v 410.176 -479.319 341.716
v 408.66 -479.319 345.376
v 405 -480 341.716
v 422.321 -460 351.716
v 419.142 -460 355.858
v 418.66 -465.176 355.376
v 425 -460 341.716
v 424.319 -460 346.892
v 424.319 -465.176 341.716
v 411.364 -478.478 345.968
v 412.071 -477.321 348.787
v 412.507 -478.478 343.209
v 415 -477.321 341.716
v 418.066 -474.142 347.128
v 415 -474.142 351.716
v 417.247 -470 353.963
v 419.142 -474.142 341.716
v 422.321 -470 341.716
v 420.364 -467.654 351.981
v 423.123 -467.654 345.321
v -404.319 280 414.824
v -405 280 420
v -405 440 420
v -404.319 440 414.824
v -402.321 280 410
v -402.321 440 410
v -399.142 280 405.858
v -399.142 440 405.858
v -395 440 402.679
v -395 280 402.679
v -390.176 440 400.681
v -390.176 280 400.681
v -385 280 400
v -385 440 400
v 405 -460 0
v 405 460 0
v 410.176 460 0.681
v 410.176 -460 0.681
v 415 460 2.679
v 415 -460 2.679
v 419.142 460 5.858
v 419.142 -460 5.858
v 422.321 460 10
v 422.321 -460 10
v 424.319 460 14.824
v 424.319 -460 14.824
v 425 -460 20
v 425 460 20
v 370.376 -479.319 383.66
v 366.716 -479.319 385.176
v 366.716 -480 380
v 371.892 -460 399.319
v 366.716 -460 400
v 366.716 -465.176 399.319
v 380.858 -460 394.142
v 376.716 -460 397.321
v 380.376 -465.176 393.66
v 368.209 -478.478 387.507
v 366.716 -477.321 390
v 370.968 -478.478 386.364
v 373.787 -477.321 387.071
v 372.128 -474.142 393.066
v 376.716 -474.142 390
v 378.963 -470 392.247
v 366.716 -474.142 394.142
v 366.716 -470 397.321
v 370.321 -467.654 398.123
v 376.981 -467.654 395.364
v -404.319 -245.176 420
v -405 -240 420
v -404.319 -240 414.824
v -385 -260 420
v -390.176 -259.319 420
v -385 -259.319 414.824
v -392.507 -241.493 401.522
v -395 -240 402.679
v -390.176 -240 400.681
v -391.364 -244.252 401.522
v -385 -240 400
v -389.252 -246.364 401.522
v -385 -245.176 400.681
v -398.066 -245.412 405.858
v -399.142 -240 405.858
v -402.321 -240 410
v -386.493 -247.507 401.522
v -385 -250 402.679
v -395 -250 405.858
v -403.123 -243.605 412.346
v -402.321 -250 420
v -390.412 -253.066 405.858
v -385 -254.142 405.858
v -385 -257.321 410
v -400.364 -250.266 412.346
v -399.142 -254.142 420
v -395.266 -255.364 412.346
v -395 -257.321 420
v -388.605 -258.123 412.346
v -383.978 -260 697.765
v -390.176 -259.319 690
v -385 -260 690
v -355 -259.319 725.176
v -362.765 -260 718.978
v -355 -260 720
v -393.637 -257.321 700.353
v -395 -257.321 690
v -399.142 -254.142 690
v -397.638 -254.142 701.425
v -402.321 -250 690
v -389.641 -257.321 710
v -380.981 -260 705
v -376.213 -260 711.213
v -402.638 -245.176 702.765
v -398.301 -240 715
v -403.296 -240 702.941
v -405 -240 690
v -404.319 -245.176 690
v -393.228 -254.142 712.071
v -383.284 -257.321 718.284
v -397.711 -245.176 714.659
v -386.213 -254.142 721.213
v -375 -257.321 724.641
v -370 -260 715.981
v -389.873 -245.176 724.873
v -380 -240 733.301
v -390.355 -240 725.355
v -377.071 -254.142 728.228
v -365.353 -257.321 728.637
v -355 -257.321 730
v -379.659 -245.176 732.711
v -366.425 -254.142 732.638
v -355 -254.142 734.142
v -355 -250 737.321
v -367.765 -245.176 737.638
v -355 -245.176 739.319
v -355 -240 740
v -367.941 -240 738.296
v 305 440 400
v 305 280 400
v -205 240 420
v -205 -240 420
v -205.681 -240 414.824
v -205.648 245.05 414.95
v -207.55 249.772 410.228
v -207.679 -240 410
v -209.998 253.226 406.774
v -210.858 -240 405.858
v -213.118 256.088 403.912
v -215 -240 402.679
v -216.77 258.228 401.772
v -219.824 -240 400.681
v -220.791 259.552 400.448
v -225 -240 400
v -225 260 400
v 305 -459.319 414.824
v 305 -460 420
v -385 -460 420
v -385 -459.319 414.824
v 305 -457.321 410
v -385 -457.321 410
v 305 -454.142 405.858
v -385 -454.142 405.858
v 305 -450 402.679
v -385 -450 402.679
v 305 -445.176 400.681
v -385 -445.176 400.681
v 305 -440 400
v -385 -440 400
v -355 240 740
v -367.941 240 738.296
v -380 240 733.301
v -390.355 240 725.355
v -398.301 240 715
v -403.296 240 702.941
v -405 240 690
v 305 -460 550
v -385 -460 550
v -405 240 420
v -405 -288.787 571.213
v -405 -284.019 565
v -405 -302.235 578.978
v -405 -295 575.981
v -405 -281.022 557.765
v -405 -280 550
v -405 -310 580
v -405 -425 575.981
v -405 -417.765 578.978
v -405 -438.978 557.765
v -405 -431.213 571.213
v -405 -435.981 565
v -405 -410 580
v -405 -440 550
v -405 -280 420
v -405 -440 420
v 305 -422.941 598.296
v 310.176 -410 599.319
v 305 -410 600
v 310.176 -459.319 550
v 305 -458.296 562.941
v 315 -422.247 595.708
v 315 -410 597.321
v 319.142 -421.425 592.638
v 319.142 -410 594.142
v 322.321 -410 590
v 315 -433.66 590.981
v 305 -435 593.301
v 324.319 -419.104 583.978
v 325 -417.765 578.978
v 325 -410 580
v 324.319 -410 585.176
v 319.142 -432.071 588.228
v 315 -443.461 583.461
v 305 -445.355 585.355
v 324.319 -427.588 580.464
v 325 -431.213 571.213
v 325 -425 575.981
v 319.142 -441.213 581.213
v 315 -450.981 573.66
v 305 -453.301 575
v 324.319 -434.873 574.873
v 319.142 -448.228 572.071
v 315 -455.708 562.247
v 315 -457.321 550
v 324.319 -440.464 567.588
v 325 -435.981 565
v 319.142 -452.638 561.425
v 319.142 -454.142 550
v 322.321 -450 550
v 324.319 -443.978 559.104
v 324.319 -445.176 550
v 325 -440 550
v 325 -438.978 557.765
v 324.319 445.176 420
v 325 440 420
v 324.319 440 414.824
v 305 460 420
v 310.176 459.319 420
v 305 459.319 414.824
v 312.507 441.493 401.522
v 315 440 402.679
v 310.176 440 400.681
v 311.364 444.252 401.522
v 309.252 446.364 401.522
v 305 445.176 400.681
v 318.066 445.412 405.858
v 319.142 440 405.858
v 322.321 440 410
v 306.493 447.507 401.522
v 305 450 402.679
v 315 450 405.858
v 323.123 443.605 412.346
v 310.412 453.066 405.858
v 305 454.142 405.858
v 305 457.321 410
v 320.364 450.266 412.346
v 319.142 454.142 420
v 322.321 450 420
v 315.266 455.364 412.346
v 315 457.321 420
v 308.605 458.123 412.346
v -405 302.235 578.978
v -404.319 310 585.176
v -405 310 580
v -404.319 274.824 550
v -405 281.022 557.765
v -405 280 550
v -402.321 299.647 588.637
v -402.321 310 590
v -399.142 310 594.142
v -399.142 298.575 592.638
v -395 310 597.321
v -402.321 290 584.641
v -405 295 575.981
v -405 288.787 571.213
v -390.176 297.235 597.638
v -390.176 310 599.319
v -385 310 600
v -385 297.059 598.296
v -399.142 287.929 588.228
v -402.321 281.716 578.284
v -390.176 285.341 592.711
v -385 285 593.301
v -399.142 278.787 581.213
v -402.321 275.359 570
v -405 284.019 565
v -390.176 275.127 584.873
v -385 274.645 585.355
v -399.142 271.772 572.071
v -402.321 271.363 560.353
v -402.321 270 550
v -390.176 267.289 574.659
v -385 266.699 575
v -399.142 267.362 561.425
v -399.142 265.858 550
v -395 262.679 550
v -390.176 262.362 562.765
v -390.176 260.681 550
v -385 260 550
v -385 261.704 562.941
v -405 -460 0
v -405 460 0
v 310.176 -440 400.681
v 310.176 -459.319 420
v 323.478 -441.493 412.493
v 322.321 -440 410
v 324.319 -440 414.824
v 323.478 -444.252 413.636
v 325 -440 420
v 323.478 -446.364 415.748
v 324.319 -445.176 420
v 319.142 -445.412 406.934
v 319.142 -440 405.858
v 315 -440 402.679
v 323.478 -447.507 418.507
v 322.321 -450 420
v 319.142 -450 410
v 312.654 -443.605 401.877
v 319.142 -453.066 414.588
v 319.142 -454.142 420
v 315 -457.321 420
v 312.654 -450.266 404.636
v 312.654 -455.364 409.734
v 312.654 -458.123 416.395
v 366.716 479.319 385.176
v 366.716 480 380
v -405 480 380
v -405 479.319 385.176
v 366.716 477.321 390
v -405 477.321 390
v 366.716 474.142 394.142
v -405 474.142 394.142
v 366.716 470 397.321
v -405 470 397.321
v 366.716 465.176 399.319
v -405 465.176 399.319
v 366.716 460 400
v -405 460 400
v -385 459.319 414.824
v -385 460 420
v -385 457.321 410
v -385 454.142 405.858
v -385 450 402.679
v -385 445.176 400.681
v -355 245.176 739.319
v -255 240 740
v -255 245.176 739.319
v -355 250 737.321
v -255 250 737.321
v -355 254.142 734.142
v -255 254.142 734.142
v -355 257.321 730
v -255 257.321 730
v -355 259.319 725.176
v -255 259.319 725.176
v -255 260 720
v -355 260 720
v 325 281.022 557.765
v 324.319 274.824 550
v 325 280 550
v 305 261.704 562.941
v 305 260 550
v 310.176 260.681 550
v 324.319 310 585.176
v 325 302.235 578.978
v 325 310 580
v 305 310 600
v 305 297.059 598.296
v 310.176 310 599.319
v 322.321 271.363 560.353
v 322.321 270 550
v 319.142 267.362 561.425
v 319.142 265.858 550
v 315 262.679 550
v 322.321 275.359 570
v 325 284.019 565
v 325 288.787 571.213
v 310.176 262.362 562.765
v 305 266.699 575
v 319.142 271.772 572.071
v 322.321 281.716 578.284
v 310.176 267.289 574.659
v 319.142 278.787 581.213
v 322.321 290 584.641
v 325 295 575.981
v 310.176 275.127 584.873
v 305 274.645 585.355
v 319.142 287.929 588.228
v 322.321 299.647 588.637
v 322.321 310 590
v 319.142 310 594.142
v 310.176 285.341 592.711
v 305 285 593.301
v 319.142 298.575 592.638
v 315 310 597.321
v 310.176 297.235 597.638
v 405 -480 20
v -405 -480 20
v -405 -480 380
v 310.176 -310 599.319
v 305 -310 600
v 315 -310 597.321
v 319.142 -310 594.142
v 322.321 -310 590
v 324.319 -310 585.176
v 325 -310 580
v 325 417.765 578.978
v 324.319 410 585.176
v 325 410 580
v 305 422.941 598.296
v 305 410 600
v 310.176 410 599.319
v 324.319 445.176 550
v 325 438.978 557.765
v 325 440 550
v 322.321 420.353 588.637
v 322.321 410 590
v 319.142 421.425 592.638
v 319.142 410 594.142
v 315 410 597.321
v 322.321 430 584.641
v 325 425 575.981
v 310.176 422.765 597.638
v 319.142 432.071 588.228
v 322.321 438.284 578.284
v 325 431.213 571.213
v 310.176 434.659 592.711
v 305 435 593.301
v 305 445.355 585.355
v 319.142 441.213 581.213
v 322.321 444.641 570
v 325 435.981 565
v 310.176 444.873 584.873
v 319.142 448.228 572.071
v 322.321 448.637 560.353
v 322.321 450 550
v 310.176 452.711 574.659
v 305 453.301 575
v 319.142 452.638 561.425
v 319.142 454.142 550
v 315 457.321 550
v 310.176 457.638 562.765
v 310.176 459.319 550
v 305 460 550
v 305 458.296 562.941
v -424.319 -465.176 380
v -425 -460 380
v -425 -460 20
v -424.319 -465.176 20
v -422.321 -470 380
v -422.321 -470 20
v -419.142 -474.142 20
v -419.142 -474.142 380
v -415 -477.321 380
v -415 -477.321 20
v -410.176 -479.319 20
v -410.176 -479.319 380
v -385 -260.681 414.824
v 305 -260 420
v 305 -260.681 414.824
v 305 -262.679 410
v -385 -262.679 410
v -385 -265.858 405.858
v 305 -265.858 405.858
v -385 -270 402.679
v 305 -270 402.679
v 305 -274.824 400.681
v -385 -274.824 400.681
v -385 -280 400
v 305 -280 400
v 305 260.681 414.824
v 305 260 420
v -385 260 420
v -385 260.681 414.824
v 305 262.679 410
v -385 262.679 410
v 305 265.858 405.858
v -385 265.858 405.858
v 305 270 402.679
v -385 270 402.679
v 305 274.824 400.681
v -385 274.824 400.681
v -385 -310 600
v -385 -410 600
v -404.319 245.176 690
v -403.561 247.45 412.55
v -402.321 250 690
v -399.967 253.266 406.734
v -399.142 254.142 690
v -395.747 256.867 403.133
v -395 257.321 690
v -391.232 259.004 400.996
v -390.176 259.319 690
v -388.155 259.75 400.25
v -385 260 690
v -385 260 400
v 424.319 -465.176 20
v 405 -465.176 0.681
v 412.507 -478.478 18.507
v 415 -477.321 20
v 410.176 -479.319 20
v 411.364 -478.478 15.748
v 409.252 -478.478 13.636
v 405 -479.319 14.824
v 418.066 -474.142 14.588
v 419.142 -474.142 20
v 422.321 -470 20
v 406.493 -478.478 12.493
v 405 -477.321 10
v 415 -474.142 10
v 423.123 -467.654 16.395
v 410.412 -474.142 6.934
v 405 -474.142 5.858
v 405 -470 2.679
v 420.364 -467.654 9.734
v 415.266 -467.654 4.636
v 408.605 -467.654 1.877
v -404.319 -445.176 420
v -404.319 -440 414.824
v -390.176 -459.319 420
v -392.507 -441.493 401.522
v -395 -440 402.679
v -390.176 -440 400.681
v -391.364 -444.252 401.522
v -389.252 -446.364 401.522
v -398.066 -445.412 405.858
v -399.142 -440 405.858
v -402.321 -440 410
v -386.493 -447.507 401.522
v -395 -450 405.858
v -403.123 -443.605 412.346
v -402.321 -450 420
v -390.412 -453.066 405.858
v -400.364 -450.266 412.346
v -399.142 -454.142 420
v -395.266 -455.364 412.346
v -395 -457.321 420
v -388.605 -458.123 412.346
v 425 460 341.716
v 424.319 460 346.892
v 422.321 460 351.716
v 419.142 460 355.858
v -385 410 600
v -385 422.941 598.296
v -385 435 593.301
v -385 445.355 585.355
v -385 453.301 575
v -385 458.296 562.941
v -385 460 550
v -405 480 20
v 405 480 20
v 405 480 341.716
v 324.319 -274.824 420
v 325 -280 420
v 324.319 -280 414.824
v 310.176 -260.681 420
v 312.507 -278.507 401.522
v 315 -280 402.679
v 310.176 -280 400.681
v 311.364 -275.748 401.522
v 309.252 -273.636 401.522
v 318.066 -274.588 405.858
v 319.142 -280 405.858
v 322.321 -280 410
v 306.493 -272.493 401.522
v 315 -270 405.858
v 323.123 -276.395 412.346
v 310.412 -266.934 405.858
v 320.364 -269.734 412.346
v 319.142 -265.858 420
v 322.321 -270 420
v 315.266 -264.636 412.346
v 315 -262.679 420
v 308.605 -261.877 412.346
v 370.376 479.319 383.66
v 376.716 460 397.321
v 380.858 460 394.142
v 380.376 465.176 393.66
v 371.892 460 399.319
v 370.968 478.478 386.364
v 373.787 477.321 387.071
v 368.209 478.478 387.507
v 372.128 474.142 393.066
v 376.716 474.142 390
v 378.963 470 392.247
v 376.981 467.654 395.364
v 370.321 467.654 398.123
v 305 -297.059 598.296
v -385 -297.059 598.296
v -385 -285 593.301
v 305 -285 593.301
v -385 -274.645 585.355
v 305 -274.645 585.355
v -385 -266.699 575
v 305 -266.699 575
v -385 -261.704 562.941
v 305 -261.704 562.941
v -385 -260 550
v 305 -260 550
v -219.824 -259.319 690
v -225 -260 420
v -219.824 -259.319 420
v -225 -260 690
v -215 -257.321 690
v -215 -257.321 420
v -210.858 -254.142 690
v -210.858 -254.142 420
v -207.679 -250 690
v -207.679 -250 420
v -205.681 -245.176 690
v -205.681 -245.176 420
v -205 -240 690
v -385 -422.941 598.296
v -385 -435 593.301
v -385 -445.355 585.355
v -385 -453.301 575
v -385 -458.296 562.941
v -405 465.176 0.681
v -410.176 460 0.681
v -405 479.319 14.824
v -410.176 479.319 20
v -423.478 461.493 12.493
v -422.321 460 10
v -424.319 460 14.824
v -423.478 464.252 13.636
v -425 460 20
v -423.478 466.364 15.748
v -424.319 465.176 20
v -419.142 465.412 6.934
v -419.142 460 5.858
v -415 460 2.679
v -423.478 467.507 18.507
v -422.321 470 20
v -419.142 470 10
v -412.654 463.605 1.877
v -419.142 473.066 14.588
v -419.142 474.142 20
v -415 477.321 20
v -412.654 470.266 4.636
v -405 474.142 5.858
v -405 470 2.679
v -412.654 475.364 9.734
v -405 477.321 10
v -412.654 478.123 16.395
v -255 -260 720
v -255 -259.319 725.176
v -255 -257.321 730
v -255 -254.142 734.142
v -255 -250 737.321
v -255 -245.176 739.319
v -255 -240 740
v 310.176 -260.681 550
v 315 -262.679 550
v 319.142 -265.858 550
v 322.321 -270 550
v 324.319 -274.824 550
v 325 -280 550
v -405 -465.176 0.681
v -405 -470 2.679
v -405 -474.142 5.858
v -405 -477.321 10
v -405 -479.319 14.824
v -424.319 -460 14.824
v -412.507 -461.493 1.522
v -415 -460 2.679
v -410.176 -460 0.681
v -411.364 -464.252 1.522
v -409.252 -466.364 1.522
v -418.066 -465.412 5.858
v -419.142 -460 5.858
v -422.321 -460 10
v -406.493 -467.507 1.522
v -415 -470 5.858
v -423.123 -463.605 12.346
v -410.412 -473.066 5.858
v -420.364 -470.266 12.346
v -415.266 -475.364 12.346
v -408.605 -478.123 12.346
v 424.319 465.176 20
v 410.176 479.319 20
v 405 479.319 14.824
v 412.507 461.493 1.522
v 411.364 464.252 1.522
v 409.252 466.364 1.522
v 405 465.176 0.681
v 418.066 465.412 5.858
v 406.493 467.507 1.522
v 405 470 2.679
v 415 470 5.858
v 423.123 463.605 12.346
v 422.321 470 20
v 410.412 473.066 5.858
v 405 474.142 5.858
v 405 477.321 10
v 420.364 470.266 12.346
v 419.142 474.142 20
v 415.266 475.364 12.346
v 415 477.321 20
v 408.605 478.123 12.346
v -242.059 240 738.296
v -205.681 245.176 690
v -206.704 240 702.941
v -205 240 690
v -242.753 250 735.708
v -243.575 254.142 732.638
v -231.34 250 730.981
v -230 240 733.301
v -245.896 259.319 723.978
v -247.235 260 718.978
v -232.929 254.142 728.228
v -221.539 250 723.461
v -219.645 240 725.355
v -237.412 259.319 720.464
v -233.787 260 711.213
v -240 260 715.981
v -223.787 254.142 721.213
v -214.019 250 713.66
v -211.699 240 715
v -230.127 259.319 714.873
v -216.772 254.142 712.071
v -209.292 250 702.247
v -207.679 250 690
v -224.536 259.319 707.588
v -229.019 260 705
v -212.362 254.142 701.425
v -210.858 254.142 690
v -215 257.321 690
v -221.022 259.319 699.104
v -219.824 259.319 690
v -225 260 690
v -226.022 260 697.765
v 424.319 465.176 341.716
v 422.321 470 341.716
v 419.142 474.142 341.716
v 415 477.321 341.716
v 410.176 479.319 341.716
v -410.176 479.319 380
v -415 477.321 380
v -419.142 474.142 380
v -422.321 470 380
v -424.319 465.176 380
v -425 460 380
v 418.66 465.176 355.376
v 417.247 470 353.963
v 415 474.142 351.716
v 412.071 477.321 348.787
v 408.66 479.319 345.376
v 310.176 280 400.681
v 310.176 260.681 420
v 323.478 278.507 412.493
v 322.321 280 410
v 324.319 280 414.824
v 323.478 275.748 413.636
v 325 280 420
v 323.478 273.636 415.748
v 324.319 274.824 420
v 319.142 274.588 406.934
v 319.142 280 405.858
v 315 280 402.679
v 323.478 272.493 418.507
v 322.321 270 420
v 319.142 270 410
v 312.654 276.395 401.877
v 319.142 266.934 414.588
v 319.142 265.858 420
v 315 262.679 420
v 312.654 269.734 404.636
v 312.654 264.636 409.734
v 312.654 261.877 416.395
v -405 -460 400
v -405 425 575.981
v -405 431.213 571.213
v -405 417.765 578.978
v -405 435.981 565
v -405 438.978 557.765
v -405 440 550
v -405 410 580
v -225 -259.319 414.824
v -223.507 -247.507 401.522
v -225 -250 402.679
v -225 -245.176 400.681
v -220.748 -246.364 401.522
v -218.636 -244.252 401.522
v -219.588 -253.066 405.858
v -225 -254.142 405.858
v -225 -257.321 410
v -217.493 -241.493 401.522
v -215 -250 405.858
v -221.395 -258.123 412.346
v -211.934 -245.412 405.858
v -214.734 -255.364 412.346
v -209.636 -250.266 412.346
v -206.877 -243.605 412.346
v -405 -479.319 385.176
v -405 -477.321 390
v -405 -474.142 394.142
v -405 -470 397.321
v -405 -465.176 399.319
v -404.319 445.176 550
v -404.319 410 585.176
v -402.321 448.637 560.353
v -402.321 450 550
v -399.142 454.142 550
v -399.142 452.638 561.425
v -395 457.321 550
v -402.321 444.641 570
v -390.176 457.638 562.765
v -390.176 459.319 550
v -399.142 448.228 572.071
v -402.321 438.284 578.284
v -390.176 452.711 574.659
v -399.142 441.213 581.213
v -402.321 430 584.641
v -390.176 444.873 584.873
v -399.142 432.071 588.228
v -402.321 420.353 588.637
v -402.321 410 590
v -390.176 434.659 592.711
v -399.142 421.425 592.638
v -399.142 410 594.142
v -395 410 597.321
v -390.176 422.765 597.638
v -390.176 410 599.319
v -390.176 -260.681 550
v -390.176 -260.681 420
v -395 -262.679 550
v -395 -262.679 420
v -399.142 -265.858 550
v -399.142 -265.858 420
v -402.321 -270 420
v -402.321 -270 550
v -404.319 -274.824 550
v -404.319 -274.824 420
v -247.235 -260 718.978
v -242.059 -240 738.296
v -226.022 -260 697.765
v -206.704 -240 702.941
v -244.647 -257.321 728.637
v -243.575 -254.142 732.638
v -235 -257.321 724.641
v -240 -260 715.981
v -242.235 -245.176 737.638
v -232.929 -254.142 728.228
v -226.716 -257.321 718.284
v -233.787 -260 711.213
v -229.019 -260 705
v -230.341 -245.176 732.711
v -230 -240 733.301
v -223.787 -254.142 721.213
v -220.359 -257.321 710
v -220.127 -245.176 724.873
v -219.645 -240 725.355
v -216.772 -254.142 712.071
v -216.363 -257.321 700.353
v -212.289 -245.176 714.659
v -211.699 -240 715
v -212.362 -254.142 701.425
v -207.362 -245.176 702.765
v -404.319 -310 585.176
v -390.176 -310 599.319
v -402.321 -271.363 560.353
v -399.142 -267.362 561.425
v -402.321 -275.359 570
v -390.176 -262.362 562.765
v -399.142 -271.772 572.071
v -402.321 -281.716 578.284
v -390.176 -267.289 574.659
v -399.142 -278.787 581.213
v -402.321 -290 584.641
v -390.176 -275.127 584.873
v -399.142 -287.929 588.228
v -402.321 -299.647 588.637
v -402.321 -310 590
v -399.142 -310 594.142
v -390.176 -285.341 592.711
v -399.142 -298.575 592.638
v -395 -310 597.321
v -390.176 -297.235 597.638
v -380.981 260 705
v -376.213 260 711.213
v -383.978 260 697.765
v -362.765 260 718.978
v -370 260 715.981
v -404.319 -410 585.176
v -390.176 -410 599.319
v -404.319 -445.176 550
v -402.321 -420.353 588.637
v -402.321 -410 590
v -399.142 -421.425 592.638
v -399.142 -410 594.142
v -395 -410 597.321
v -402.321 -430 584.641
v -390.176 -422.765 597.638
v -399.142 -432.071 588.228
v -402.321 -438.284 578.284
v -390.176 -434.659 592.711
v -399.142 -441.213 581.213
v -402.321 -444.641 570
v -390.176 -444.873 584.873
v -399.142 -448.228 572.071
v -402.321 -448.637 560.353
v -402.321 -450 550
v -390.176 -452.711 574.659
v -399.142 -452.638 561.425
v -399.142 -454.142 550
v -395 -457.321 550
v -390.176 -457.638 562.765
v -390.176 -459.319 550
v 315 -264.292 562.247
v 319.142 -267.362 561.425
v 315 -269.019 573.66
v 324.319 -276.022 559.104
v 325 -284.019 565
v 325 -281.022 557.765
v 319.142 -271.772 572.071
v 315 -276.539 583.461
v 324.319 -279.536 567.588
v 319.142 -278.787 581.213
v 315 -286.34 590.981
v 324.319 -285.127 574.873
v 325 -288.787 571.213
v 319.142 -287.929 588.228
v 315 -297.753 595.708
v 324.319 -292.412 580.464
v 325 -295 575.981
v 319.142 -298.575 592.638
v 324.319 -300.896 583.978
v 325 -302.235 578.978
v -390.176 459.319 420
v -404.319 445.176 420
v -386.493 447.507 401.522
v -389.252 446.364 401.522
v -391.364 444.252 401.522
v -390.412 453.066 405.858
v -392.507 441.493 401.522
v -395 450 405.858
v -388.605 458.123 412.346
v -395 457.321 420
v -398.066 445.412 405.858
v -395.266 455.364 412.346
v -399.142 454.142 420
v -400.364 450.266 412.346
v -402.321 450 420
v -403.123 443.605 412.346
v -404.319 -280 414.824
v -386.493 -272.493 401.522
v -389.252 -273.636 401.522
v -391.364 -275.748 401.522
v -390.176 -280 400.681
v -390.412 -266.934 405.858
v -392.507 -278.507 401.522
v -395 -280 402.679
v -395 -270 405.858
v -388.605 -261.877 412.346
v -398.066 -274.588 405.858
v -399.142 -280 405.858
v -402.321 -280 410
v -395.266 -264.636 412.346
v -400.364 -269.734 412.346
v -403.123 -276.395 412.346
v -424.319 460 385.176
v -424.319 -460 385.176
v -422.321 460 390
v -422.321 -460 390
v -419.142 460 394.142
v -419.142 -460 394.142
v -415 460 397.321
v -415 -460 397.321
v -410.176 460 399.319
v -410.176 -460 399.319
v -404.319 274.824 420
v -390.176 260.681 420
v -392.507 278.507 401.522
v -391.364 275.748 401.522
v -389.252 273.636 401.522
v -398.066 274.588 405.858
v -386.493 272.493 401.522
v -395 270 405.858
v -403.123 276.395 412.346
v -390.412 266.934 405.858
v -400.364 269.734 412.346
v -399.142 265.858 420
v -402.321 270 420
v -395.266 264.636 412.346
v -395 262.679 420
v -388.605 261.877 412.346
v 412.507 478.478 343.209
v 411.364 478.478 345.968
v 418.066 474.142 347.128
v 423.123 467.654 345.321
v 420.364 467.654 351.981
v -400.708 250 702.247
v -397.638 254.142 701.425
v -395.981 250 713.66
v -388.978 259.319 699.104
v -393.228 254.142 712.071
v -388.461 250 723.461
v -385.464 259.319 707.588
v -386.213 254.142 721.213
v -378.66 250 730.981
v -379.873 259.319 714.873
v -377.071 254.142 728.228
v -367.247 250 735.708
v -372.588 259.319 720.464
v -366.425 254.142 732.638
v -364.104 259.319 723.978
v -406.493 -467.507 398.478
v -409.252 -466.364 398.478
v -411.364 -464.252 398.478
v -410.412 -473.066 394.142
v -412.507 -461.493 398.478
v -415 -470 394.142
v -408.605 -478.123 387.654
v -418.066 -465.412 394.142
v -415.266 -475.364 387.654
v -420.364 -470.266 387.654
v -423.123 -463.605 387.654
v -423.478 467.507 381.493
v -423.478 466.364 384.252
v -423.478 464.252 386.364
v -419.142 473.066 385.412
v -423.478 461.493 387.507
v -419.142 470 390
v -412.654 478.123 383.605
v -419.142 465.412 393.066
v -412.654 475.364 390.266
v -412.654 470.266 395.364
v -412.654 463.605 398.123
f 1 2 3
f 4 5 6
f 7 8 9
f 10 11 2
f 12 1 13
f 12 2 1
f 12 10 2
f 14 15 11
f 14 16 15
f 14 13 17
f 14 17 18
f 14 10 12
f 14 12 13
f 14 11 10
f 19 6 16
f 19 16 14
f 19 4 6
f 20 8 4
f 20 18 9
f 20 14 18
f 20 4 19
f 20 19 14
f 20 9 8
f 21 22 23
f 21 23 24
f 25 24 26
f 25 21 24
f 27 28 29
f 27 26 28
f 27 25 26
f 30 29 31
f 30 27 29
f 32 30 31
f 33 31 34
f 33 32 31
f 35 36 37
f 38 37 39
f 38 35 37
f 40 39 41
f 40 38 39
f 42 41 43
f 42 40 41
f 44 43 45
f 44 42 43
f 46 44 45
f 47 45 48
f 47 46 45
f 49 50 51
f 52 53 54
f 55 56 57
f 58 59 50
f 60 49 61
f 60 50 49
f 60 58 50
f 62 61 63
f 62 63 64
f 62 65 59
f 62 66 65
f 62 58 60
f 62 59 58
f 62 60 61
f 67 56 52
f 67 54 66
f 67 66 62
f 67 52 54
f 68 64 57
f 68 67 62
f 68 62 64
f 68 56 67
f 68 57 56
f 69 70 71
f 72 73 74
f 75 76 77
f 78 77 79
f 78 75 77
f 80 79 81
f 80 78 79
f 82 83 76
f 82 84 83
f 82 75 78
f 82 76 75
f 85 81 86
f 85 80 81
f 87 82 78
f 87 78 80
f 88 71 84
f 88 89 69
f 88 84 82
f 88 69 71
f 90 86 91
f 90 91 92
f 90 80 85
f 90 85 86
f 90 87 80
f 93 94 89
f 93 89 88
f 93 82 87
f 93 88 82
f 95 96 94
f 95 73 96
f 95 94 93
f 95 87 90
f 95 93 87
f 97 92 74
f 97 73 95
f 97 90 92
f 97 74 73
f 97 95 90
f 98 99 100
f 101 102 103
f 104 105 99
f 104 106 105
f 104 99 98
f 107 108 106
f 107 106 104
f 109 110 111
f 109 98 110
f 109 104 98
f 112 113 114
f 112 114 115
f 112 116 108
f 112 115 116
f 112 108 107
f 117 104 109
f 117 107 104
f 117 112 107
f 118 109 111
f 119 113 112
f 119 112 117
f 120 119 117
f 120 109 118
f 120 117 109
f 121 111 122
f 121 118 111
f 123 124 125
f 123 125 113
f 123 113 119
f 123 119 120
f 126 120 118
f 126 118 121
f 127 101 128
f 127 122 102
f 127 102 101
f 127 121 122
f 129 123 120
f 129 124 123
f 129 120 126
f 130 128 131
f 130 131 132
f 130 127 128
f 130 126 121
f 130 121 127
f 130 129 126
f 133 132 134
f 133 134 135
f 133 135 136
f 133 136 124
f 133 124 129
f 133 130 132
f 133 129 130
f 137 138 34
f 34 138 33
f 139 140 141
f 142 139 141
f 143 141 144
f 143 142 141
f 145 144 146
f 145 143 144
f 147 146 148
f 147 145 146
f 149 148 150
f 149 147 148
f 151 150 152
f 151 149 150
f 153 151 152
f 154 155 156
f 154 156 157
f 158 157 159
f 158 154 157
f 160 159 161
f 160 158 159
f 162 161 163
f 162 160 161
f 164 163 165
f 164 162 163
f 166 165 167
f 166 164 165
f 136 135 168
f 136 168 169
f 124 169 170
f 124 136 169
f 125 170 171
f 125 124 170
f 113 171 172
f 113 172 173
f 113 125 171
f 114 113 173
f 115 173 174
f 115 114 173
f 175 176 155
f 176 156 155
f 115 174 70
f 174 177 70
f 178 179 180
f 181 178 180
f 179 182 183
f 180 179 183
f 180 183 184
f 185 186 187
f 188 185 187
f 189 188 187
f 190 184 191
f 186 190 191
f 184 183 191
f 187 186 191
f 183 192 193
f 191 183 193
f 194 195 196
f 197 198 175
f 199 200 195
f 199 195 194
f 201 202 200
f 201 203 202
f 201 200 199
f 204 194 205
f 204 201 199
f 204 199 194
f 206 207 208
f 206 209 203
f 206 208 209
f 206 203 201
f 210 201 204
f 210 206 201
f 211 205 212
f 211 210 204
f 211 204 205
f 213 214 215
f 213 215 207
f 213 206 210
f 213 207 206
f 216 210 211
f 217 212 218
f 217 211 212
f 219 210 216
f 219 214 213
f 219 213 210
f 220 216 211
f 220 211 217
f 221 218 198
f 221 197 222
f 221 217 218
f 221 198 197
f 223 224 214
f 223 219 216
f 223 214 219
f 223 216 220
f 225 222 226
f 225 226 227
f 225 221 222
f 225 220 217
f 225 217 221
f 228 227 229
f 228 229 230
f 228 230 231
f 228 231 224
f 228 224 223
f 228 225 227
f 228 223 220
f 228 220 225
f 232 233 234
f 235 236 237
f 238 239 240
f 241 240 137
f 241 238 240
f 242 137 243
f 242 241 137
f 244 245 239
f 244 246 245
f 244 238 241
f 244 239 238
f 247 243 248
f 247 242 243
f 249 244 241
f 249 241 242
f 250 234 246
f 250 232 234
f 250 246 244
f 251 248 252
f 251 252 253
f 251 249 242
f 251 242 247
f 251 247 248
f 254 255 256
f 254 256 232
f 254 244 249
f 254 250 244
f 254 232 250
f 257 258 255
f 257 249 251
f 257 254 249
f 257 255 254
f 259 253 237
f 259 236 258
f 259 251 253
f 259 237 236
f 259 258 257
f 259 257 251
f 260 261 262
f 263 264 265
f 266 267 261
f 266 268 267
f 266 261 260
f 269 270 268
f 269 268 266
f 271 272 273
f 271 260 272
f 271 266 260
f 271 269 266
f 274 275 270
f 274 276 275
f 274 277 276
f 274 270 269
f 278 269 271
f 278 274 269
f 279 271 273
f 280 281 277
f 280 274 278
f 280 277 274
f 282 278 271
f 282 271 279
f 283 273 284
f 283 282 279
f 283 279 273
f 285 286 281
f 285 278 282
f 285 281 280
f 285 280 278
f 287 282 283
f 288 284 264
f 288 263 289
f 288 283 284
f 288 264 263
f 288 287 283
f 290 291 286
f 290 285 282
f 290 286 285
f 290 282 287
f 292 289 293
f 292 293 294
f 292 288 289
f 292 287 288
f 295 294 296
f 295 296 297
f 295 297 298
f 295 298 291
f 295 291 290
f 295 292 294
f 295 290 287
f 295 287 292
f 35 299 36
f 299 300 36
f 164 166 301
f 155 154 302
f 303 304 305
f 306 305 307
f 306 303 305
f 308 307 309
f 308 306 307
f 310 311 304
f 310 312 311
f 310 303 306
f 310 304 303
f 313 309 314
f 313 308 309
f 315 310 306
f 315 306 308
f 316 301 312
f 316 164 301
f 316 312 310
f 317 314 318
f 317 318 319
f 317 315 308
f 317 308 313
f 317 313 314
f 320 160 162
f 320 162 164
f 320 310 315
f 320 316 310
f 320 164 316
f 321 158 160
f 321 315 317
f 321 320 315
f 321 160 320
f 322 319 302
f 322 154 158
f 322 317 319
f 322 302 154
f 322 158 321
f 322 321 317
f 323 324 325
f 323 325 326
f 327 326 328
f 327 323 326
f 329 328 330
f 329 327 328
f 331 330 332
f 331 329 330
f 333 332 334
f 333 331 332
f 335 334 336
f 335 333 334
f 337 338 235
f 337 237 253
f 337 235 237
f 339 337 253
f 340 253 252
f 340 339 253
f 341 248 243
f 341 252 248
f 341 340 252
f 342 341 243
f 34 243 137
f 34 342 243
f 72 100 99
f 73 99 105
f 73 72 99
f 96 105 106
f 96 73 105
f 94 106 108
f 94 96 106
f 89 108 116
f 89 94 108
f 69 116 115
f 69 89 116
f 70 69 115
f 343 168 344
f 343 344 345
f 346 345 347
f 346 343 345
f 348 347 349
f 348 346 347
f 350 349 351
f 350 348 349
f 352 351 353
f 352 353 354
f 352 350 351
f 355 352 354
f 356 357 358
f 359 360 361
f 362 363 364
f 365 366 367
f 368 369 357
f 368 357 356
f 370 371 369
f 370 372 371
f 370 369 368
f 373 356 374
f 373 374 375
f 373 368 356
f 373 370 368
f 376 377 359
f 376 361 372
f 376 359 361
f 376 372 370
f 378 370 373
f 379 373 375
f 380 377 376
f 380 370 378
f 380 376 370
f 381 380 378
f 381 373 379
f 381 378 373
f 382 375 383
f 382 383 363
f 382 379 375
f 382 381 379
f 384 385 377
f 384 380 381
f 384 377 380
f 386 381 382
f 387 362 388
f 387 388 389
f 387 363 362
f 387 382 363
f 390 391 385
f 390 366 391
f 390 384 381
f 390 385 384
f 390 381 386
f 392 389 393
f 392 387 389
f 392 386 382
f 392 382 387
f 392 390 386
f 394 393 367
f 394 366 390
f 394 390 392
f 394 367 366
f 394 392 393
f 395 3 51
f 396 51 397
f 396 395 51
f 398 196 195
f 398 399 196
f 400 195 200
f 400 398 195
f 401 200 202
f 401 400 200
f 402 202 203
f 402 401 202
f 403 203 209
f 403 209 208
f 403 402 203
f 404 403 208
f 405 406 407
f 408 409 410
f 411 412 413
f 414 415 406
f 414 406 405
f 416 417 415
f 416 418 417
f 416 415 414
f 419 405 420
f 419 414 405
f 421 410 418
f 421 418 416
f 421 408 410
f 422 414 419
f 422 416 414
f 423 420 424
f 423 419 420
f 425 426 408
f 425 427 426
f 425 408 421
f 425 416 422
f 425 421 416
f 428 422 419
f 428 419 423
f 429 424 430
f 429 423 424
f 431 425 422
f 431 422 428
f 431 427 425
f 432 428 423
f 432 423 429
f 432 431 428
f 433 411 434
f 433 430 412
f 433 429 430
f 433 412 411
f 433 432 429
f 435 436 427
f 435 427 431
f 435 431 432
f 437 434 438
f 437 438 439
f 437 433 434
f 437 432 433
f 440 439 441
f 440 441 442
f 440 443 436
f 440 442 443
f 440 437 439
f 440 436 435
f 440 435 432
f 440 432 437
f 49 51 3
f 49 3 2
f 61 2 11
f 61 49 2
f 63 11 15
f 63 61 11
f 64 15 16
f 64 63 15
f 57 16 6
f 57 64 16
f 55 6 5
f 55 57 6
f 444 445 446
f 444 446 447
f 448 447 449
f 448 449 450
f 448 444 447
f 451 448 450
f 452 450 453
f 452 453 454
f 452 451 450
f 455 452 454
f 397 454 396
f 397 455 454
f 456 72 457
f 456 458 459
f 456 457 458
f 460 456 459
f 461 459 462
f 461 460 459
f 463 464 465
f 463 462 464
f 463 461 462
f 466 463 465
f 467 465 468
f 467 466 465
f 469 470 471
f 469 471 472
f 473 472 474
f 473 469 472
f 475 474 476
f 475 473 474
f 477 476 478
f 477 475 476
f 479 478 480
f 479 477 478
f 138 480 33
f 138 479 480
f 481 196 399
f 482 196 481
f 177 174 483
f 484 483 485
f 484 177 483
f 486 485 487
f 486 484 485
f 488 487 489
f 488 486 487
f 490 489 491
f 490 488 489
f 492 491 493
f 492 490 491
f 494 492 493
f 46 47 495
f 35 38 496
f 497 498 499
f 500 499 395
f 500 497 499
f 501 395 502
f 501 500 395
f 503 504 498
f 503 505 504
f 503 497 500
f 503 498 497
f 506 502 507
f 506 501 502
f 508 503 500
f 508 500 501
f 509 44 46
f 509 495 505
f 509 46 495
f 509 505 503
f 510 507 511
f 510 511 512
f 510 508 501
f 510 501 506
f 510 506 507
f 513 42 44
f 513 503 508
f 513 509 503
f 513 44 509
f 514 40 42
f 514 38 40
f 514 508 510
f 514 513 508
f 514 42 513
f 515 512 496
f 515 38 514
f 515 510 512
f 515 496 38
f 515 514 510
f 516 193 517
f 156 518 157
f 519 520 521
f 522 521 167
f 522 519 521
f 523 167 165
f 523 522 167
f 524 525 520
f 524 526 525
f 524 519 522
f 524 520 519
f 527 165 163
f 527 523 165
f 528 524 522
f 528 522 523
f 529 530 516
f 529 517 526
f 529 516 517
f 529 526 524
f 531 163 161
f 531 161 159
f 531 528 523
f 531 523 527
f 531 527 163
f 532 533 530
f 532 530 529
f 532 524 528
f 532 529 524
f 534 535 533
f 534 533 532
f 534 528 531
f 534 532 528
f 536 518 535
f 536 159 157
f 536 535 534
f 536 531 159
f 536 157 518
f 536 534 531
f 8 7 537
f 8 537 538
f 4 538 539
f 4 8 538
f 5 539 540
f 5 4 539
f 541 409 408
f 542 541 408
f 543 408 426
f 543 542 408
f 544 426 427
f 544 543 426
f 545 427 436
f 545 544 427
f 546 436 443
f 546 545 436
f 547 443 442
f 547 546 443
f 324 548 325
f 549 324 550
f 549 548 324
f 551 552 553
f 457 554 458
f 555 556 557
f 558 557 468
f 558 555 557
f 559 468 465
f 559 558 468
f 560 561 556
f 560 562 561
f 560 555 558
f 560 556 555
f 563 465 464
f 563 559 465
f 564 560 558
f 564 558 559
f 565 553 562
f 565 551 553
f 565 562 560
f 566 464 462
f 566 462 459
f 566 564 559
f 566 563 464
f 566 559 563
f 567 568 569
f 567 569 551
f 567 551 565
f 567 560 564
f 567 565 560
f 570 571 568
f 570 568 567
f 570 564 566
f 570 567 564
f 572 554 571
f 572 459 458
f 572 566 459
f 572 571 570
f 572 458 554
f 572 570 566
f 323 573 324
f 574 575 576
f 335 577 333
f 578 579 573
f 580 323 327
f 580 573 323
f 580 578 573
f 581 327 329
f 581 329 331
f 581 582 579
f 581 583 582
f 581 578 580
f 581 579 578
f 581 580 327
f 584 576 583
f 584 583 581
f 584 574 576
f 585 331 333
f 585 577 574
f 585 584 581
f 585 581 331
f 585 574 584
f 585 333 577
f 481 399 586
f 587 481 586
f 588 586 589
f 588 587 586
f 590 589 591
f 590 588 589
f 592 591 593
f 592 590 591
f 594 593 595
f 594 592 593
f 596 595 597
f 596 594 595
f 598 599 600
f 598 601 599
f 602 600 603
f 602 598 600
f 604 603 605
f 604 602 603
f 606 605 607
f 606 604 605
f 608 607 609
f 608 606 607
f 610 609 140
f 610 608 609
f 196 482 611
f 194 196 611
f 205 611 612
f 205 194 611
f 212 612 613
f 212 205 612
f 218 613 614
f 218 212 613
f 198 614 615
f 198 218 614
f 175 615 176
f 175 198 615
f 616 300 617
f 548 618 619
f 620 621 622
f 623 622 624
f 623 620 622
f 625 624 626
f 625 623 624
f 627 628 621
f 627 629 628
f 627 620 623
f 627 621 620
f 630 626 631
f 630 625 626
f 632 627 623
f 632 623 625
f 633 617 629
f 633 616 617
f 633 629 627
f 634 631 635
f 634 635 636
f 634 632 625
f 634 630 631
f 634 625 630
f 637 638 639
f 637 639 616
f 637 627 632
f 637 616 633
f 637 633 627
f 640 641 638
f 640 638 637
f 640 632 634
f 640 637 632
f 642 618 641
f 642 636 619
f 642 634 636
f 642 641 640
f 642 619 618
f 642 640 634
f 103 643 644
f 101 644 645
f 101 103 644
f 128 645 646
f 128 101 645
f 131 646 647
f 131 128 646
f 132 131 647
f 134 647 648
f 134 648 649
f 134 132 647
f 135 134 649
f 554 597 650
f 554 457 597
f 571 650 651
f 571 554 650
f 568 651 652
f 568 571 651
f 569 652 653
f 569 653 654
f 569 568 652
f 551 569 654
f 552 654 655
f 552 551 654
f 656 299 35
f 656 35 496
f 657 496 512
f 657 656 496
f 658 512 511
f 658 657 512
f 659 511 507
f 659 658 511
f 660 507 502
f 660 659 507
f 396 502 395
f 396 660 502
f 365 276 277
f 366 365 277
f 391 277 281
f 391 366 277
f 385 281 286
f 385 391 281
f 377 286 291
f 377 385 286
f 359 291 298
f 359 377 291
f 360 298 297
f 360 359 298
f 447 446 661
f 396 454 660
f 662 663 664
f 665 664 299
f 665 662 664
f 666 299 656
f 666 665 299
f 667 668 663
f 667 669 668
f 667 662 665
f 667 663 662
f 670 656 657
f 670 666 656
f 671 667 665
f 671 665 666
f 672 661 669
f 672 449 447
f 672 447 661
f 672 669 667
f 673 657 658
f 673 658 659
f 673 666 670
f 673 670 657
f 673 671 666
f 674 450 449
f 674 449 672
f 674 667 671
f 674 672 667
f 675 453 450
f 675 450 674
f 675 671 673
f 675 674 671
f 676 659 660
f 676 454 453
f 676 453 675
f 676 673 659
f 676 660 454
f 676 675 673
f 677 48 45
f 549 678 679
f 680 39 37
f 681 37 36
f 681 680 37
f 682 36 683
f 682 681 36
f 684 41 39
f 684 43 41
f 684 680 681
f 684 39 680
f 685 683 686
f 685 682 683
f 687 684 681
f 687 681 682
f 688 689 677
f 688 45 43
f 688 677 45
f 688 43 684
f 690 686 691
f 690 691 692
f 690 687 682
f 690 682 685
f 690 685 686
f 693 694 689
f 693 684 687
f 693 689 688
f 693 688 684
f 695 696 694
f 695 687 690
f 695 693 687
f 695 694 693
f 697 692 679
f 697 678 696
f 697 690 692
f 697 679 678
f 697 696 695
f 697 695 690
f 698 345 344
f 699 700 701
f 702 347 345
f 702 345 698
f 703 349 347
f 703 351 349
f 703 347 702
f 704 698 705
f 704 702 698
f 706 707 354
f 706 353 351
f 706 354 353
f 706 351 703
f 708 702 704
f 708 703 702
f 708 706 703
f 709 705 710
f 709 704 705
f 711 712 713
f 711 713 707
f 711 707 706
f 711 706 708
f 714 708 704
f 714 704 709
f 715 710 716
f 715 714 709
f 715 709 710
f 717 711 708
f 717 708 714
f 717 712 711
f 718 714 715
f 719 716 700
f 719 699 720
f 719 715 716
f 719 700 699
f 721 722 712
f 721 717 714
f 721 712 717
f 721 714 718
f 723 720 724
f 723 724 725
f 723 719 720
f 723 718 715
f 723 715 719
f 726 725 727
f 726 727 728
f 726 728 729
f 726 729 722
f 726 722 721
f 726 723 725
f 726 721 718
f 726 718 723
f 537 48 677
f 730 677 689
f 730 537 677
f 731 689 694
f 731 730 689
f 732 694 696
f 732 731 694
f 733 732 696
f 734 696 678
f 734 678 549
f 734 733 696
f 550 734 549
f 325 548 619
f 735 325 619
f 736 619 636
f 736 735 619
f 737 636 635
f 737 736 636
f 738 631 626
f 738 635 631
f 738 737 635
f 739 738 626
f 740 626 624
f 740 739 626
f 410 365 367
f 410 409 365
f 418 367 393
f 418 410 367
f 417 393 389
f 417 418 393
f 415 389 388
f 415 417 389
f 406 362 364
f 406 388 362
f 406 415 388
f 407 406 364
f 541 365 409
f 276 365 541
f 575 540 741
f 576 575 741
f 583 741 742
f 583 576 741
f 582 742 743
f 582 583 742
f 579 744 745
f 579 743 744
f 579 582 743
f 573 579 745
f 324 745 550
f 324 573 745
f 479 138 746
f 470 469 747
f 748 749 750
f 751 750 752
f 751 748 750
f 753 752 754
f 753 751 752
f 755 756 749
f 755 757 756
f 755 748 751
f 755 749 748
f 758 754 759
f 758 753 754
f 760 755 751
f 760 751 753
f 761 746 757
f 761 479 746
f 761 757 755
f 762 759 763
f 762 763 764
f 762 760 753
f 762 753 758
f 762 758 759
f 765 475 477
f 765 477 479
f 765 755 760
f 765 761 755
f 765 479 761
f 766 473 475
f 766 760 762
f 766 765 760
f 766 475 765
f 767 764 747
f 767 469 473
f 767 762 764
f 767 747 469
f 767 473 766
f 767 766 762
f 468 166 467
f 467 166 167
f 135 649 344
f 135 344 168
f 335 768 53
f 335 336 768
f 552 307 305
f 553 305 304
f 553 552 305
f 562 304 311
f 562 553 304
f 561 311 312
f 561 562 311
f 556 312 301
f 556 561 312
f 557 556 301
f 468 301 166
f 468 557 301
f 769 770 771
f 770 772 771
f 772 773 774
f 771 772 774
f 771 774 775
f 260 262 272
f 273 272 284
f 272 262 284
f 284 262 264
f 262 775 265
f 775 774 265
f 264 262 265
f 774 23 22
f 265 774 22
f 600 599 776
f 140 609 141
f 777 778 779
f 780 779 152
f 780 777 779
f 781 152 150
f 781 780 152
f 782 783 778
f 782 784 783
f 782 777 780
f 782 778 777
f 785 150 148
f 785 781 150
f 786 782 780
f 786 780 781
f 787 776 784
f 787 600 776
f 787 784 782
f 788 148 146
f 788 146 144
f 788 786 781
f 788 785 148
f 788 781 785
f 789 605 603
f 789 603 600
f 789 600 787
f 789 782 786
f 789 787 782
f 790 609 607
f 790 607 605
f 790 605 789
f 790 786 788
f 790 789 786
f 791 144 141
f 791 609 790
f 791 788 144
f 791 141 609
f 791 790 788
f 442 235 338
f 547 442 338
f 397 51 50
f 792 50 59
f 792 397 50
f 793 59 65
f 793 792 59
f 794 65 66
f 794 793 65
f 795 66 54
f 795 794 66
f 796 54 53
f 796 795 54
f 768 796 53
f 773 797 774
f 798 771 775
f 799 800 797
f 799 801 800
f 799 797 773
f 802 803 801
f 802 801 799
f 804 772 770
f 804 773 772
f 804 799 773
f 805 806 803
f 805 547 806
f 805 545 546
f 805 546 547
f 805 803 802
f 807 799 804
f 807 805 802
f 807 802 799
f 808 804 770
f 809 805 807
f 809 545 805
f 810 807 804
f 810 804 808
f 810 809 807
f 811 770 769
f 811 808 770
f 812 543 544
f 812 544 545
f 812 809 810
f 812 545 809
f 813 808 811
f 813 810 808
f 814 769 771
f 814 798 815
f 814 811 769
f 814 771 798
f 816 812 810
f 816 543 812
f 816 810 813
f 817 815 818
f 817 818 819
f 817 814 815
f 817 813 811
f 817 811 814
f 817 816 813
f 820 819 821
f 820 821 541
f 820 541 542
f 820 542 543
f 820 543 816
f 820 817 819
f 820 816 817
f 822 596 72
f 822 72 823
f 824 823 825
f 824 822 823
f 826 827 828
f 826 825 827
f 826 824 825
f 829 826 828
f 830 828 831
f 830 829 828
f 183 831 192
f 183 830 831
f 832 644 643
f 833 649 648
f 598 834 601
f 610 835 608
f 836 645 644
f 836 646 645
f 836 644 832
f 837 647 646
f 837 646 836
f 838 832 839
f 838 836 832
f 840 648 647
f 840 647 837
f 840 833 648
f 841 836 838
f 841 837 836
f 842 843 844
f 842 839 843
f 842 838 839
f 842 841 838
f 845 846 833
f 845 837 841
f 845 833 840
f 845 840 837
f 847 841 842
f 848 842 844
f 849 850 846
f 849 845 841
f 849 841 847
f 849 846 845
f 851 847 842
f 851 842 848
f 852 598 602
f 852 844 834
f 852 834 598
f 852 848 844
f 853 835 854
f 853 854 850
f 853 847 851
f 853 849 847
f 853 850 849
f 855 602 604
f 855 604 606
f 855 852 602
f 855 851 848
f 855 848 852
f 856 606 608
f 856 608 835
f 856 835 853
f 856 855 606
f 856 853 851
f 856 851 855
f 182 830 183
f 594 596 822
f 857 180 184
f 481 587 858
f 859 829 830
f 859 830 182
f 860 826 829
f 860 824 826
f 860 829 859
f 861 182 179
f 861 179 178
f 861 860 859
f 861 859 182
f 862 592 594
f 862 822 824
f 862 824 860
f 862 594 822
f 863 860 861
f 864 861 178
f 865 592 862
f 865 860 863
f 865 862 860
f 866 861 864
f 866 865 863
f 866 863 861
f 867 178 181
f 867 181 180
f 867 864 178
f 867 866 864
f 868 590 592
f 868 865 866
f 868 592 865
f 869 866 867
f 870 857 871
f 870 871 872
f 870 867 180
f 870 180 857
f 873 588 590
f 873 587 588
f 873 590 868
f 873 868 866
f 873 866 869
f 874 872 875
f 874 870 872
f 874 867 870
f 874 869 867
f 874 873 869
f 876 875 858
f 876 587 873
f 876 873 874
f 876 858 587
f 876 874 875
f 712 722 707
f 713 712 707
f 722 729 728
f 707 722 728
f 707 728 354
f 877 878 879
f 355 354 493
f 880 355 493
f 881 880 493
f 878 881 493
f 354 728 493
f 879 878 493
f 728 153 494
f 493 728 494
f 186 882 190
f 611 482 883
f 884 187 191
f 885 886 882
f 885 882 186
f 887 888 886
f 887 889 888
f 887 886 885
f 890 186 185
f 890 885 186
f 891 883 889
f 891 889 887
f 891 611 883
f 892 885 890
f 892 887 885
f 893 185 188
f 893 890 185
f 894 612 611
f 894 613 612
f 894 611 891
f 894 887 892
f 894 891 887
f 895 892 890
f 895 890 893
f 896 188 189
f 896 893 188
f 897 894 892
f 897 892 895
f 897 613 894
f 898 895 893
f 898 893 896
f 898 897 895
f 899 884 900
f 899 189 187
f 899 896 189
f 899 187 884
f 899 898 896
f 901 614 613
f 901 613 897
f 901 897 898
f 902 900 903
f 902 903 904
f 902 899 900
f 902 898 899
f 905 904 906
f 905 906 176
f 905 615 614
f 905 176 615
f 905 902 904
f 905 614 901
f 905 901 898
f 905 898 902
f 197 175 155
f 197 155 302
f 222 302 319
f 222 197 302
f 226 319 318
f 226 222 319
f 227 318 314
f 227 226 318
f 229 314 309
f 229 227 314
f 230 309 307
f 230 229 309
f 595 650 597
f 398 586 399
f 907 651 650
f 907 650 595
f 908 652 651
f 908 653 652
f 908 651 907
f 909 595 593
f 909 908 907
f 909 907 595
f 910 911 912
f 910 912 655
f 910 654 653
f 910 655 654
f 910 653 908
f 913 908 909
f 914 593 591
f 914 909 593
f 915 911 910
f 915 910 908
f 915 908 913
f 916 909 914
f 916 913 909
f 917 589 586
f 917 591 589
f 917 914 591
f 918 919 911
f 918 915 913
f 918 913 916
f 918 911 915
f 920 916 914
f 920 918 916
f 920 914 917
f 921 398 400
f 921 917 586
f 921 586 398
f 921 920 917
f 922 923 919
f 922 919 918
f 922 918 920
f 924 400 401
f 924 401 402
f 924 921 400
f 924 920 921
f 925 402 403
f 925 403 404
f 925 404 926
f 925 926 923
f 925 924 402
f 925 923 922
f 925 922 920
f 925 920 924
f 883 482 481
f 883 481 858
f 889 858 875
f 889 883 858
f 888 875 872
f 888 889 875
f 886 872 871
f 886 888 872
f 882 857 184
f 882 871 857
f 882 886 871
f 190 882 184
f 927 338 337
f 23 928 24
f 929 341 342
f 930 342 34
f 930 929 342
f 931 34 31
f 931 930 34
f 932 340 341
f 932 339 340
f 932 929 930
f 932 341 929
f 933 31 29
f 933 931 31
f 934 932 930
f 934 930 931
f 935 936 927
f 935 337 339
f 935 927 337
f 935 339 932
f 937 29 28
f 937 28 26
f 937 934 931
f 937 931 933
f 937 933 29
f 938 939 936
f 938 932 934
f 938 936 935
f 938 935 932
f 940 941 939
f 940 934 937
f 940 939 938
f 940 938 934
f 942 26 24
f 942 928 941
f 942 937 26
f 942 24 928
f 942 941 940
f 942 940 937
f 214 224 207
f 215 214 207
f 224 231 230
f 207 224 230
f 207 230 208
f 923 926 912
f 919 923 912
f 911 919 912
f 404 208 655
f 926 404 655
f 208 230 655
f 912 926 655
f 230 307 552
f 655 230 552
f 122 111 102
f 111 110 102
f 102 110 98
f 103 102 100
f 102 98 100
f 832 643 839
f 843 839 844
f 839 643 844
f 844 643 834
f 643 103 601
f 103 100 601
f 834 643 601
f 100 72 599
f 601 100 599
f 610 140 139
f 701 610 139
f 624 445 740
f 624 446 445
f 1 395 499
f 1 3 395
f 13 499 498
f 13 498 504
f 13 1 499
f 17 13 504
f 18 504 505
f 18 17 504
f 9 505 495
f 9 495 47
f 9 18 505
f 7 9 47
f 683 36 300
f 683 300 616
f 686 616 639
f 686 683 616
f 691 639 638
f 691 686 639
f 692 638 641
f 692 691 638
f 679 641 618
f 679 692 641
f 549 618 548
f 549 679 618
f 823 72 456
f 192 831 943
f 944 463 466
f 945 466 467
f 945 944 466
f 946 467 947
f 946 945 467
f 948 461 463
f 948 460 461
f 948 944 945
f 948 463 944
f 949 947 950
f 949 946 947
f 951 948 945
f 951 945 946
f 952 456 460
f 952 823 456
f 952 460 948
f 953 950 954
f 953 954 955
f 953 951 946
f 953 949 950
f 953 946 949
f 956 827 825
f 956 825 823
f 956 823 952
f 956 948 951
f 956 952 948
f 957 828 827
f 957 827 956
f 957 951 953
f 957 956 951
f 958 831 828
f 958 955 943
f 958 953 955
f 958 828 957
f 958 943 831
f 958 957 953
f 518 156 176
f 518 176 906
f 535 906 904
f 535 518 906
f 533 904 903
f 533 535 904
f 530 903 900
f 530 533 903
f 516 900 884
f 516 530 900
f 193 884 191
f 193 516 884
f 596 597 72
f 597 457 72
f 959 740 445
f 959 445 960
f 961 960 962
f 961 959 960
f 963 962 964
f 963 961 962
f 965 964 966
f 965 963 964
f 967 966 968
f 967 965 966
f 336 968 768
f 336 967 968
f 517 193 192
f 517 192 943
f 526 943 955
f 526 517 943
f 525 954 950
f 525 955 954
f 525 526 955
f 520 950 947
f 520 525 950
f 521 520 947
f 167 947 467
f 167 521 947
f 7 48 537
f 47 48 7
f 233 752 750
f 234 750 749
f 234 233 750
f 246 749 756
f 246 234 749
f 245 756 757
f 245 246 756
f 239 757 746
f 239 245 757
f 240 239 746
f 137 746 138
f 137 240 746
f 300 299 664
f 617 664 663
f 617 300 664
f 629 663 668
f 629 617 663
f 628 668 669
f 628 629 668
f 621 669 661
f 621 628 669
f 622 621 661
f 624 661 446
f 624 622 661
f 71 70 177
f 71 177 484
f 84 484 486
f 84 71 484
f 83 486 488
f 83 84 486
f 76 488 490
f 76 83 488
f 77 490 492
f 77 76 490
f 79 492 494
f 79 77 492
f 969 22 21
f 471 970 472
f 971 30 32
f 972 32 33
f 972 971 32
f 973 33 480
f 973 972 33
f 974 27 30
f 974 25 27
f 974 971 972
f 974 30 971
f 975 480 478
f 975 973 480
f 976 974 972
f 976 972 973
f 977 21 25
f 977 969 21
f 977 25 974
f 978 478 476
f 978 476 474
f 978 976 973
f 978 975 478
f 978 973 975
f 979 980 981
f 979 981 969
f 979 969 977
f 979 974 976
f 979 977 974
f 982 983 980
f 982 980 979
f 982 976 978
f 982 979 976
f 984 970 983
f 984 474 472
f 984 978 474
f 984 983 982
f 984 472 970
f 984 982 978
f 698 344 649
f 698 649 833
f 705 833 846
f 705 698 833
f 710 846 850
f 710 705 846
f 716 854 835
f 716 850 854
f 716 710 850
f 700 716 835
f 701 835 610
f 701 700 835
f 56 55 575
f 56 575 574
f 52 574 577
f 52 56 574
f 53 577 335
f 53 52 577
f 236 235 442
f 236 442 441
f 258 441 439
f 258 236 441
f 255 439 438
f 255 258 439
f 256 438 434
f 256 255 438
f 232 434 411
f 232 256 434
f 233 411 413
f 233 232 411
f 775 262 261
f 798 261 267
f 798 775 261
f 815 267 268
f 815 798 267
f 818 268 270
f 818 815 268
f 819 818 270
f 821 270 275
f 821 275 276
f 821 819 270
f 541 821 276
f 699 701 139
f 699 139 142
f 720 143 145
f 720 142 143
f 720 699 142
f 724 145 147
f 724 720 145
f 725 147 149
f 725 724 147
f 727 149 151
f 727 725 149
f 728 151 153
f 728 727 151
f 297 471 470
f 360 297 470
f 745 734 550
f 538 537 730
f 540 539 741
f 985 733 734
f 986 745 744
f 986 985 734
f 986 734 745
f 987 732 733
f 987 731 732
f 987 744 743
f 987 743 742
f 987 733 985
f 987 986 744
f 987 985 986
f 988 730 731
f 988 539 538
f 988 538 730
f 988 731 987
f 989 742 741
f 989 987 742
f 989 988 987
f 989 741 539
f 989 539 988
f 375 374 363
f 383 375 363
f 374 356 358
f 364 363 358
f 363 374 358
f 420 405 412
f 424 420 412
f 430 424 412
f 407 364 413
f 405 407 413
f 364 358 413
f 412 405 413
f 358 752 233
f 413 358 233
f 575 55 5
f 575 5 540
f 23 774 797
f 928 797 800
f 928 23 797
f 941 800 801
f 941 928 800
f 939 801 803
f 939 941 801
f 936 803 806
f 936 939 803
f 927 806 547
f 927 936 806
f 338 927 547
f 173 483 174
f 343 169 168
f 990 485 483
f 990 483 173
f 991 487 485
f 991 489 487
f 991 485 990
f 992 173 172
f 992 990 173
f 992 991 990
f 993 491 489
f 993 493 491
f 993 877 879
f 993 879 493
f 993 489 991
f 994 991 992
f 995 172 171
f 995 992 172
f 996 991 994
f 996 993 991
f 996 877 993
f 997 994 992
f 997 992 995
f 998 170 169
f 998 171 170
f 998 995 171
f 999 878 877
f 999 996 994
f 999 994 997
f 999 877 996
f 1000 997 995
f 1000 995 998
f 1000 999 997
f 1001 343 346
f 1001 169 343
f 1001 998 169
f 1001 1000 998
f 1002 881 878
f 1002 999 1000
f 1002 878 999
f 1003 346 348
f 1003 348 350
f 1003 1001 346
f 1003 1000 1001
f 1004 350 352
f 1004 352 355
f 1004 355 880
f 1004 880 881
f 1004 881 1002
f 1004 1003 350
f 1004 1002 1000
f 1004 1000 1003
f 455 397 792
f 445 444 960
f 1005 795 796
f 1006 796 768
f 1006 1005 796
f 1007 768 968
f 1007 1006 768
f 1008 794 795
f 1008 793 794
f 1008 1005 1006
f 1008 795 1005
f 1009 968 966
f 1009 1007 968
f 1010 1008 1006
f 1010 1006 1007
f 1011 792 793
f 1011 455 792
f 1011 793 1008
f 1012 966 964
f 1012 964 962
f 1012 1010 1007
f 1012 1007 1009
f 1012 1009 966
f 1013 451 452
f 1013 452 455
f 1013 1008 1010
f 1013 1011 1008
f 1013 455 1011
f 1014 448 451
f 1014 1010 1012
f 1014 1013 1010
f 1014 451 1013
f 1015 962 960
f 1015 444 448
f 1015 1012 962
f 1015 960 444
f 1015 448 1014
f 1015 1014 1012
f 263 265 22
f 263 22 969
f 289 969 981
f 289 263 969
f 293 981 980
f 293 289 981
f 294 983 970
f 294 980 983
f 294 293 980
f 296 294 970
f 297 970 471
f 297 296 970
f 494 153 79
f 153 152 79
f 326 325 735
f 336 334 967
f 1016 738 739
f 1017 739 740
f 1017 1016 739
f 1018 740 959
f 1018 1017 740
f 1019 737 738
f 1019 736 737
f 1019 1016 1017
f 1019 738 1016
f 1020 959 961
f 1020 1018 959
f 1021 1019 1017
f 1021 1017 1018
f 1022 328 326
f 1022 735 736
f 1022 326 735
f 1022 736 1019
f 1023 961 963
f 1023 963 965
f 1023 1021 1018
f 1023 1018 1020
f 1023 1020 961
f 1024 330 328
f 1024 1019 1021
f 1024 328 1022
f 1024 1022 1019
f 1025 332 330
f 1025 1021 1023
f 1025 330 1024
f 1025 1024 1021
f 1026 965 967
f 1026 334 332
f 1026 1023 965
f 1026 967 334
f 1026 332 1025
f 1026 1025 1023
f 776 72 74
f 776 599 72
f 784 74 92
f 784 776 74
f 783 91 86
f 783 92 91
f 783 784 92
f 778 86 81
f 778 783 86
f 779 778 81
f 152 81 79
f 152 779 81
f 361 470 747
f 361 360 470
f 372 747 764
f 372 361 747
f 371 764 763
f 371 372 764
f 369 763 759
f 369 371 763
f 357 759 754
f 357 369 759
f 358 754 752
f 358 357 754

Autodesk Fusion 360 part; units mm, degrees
sketch "Sketch1" plane through (0, 0, 0) normal (0, 0, 1) x (1, 0, 0)
  line L0 (425, -480) -> (-425, -480)
  line L1 (-425, -480) -> (-425, 480)
  line L2 (-425, 480) -> (425, 480)
  line L3 (425, 480) -> (425, -480)
  line L4 (425, -480) -> (-425, 480) construction
  line L5 (-425, -480) -> (425, 480) construction
  line L6 (-405, -460) -> (325, -460)
  line L7 (325, -460) -> (325, -260)
  line L8 (325, -260) -> (-405, -260)
  line L9 (-405, -260) -> (-405, -460)
  line L10 (-405, -260) -> (-205, -260)
  line L11 (-205, -260) -> (-205, 260)
  line L12 (-205, 260) -> (-405, 260)
  line L13 (-405, 260) -> (-405, -260)
  line L14 (-405, 260) -> (325, 260)
  line L15 (325, 260) -> (325, 460)
  line L16 (325, 460) -> (-405, 460)
  line L17 (-405, 460) -> (-405, 260)
  dimension "d1" = 960
  dimension "d2" = 850
  dimension "d3" = 20
  dimension "d4" = 20
  dimension "d5" = 20
  dimension "d6" = 200
  dimension "d7" = 200
  dimension "d8" = 100
extrude "Extrude1" add sketch "Sketch1" along normal blind 400 contours L0 L1 L2 L3 | L6 L7 L8 L9 L10 | L8 L10 L11 L12 L13 L14 | L12 L14 L15 L16 L17 makes body 1
sketch "Sketch2" plane through (0, 0, 400) normal (0, 0, 1) x (-1, 0, 0)
  line L0 (-425, -480) -> (425, -480)
  line L1 (425, -480) -> (425, 480)
  line L2 (425, 480) -> (-425, 480)
  line L3 (-425, 480) -> (-425, -480)
  line L4 (405, 460) -> (-325, 460)
  line L5 (-325, 260) -> (405, 260)
  line L6 (405, 260) -> (405, 460)
  line L7 (-325, 460) -> (-325, 260)
  line L8 (405, -460) -> (405, -260)
  line L9 (405, -260) -> (-325, -260)
  line L10 (-325, -460) -> (405, -460)
  line L11 (-325, -260) -> (-325, -460)
extrude "Extrude2" add sketch "Sketch2" along normal blind 200 separate body contours L4 L5 L6 L7 | L8 L9 L10 L11 makes body 2 at (81.6667, -393.3333, 400) makes body 3 at (-161.6667, 393.3333, 400)
sketch "Sketch3" plane through (0, 0, 400) normal (0, 0, 1) x (-1, 0, 0)
  line L0 (-425, -480) -> (425, -480)
  line L1 (425, -480) -> (425, 480)
  line L2 (425, 480) -> (-425, 480)
  line L3 (-425, 480) -> (-425, -480)
  line L4 (205, 260) -> (205, -260)
  line L5 (205, -260) -> (405, -260)
  line L6 (405, 260) -> (205, 260)
  line L7 (405, -260) -> (405, 260)
extrude "Extrude3" add sketch "Sketch3" along normal blind 340 separate body contours L4 L5 L6 L7 makes body 4
chamfer "Chamfer2" distance 50 angle 45 1 edges at (425, 0, 400) on bodies 1
fillet "Fillet2" radius 20 7 faces at (425, 160, 116.6667) (391.6667, 160, 383.3333) (125, 480, 133.3333) (-425, -160, 133.3333) (125, -480, 133.3333) (-141.6667, -160, 0) (-158.3333, 160, 400) on bodies 1
fillet "Fillet3" radius 50 6 edges at (-40, -460, 600) (-40, -260, 600) (-40, 260, 600) (-40, 460, 600) (-205, 0, 740) (-405, 0, 740) on bodies 2 3 4
fillet "Fillet4" radius 20 21 faces at (-405, -326.6667, 450) (-161.6667, -460, 450) (-161.6667, -419.4626, 599.0964) (81.6667, -376.6667, 600) (81.6667, -300.5374, 599.0964) (81.6667, -260, 450) (325, -393.3333, 450) (-161.6667, 260, 450) (-161.6667, 300.5374, 599.0964) (-161.6667, 376.6667, 600) (81.6667, 432.9113, 594.4418) (-161.6667, 460, 500) (325, 326.6667, 450) (-405, 393.3333, 450) (-205, -86.6667, 593.3333) (-218.8133, -86.6667, 724.504) (-288.3333, -86.6667, 740) (-377.9113, 86.6667, 734.4418) (-405, 86.6667, 593.3333) (-271.6667, 260, 496.6667) (-338.3333, -260, 593.3333) on bodies 2 3 4
